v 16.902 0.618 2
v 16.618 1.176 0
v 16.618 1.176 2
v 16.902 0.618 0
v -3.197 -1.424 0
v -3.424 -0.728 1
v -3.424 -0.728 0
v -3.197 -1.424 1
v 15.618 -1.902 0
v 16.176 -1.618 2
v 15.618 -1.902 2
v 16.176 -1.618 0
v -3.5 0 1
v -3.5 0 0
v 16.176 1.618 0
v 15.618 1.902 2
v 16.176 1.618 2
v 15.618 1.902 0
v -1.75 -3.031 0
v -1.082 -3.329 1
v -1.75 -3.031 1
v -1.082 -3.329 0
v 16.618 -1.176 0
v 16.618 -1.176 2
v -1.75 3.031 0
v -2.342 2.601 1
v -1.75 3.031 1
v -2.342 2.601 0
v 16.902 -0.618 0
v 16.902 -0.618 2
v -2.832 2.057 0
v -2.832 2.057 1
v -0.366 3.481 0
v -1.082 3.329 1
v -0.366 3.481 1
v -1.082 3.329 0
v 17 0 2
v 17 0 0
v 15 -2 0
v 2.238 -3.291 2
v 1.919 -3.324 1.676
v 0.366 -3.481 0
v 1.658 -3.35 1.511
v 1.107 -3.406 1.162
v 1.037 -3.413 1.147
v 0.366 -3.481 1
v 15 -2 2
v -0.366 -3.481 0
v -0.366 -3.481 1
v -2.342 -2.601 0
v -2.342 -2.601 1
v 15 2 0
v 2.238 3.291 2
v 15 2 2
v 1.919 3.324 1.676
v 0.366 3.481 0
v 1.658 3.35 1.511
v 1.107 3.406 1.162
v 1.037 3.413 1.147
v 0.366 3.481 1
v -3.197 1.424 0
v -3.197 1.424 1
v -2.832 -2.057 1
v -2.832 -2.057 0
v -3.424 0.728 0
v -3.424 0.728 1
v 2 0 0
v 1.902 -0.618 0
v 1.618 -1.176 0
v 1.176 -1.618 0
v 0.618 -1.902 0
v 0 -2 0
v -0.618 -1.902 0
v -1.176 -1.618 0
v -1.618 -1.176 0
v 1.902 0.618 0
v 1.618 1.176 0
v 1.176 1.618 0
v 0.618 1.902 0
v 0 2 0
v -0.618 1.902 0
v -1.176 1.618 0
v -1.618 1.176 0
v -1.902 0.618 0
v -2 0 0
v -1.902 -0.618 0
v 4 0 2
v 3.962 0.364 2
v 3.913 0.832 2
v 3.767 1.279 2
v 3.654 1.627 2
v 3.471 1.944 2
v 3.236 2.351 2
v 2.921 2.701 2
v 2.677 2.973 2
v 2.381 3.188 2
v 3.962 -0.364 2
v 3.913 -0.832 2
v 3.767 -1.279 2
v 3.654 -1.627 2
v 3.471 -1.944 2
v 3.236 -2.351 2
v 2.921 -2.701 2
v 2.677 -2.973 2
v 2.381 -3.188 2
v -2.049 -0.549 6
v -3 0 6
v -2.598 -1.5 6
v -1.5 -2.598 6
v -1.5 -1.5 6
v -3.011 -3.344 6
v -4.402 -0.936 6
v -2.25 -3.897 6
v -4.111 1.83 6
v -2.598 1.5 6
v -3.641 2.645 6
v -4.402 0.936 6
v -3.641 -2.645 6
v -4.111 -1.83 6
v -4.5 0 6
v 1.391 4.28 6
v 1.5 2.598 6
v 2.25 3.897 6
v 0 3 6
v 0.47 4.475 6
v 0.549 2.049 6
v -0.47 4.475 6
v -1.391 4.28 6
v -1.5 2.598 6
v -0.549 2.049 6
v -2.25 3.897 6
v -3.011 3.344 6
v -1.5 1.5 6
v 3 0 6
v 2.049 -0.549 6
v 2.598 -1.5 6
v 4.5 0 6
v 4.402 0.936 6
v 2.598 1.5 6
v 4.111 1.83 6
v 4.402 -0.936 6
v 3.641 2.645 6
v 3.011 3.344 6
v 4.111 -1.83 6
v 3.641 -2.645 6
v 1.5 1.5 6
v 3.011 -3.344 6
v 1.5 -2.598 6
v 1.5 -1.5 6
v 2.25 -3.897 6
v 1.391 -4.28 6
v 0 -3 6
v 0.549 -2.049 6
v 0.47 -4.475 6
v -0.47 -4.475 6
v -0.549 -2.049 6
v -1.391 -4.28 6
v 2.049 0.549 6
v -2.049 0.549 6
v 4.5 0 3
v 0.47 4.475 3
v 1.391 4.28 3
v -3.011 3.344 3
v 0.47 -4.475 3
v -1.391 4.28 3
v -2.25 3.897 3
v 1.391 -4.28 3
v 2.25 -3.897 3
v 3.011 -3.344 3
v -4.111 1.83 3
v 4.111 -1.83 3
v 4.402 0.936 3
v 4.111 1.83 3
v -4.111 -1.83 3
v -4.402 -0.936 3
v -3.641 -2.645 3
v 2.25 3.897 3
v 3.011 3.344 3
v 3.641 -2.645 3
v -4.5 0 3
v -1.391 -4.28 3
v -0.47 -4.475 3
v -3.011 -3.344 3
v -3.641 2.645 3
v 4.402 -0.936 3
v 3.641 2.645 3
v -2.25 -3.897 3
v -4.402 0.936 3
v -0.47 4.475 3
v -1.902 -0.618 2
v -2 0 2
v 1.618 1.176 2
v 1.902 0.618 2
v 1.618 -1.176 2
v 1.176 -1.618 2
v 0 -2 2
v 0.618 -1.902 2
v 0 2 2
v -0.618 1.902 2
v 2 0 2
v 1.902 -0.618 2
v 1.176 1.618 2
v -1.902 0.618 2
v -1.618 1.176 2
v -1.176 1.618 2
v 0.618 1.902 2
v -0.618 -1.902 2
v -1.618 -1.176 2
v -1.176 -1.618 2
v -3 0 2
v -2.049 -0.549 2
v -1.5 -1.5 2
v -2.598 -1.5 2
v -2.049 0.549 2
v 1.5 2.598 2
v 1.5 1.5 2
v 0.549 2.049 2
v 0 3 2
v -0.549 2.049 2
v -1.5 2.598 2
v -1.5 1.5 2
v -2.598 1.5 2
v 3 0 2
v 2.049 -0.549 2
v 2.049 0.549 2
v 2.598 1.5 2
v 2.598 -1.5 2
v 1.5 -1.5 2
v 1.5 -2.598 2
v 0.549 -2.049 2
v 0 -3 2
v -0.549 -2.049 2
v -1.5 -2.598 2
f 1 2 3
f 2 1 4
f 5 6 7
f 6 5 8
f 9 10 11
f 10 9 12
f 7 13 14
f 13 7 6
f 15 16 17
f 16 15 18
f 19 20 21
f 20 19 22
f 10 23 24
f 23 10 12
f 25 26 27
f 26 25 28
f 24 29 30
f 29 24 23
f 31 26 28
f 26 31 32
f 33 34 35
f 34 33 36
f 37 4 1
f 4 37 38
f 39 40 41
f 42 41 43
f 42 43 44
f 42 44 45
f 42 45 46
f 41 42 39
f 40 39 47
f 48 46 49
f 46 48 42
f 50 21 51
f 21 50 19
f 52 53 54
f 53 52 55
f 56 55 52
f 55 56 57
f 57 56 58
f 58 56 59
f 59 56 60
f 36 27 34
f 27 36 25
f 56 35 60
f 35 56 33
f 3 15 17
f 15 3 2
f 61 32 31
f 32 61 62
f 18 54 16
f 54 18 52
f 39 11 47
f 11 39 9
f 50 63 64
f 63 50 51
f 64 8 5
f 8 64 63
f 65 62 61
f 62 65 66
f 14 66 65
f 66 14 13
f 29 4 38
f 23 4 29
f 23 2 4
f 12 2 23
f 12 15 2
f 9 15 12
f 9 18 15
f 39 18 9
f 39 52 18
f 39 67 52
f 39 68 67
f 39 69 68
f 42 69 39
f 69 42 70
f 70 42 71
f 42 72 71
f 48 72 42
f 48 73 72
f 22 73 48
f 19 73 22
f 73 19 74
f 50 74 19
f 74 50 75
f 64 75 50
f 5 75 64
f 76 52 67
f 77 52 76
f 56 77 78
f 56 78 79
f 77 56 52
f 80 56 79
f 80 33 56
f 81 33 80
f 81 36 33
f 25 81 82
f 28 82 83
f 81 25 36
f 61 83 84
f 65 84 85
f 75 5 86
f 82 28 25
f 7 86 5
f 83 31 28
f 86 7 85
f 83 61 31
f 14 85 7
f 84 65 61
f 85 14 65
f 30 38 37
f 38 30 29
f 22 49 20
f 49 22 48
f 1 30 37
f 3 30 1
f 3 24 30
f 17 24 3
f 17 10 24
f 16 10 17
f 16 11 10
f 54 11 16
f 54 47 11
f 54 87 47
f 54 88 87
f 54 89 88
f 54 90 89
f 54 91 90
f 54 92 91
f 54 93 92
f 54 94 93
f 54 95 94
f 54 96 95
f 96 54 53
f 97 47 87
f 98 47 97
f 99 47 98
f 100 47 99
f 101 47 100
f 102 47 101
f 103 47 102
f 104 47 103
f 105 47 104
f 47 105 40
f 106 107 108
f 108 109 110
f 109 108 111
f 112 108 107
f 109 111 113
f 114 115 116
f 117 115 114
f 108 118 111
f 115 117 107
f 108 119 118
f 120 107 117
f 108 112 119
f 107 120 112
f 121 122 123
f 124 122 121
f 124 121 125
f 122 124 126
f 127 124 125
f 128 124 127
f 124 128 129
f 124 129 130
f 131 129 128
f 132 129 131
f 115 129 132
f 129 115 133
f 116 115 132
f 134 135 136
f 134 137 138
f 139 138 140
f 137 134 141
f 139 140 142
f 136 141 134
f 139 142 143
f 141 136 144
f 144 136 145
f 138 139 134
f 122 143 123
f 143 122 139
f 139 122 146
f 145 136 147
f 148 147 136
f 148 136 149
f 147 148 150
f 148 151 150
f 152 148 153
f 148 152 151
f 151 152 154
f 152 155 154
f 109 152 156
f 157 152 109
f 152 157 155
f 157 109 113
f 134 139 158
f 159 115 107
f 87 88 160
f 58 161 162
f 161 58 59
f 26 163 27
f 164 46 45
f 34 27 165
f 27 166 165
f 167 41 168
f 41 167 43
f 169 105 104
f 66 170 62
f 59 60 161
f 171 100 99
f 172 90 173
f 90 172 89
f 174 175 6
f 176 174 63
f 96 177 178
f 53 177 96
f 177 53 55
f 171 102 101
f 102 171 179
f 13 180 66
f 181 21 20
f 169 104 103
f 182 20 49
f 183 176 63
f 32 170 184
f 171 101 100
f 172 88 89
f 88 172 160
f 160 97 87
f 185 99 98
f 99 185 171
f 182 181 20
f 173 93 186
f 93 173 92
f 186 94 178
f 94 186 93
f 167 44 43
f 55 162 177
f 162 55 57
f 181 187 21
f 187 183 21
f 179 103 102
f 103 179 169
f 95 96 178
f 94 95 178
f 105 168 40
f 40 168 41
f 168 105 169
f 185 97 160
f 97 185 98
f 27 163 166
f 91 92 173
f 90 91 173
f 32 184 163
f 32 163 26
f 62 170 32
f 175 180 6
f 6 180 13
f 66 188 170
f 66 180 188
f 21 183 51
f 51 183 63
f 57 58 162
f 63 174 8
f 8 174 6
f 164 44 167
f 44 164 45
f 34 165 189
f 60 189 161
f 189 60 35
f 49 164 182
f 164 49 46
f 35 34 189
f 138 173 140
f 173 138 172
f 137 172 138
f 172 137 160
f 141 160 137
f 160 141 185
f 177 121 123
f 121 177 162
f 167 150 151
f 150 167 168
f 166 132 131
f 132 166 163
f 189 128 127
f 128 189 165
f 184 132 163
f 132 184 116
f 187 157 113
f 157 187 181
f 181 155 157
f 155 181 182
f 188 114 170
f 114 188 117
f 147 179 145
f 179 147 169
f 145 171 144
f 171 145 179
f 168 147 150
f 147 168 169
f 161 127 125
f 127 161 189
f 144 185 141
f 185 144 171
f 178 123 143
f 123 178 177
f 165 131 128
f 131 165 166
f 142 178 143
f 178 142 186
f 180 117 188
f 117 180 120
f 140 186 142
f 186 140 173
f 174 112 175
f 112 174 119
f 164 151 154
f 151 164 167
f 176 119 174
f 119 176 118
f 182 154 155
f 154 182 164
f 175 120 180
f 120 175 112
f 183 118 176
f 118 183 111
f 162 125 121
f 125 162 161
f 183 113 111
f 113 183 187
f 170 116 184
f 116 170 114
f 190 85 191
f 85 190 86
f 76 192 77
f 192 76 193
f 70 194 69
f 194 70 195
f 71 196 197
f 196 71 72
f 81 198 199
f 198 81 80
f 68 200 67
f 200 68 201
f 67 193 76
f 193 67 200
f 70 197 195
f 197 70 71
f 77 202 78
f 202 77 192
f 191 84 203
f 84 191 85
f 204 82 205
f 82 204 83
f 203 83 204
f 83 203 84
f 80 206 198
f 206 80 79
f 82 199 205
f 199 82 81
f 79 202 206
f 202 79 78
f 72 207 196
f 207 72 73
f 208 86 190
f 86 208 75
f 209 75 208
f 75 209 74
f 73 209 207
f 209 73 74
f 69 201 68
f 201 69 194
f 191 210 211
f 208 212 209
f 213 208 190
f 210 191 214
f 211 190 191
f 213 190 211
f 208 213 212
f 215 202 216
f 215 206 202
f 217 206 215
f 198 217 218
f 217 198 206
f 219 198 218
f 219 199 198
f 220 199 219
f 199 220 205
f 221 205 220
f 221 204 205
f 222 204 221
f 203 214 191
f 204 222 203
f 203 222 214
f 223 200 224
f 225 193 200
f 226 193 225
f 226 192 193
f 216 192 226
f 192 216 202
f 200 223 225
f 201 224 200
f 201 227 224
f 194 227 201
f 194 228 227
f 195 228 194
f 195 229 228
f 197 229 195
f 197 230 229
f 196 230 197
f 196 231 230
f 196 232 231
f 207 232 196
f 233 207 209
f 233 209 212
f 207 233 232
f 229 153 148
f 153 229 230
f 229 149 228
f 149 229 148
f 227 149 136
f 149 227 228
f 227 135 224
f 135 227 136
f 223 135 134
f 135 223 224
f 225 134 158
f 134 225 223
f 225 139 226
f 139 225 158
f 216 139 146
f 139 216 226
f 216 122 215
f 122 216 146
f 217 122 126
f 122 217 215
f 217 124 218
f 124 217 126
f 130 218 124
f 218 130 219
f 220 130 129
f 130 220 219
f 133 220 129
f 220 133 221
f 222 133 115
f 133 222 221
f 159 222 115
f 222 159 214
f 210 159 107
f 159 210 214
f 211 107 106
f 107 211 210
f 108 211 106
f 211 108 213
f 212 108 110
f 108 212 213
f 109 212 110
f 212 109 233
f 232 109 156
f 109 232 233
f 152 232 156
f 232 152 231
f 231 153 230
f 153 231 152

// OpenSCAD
difference() { union() {
linear_extrude(2) hull() {
  circle(d=7,$fn=30);
  translate([15,0]) circle(d=4,$fn=20);
}
cylinder(d=7,h=6,$fn=30);
translate([0,0,1]) cylinder(d1=7,d2=9,h=2,$fn=30);
translate([0,0,3]) cylinder(d=9,h=3,$fn=30);
}
  translate([0,0,-.01]) cylinder(d=4,h=2.02,$fn=20);
  translate([0,0,2]) linear_extrude(10,convexity=3) {
    for(r=[0:30:120]) rotate([0,0,r])
    circle(d=6,h=10,$fn=3);
  }
}
